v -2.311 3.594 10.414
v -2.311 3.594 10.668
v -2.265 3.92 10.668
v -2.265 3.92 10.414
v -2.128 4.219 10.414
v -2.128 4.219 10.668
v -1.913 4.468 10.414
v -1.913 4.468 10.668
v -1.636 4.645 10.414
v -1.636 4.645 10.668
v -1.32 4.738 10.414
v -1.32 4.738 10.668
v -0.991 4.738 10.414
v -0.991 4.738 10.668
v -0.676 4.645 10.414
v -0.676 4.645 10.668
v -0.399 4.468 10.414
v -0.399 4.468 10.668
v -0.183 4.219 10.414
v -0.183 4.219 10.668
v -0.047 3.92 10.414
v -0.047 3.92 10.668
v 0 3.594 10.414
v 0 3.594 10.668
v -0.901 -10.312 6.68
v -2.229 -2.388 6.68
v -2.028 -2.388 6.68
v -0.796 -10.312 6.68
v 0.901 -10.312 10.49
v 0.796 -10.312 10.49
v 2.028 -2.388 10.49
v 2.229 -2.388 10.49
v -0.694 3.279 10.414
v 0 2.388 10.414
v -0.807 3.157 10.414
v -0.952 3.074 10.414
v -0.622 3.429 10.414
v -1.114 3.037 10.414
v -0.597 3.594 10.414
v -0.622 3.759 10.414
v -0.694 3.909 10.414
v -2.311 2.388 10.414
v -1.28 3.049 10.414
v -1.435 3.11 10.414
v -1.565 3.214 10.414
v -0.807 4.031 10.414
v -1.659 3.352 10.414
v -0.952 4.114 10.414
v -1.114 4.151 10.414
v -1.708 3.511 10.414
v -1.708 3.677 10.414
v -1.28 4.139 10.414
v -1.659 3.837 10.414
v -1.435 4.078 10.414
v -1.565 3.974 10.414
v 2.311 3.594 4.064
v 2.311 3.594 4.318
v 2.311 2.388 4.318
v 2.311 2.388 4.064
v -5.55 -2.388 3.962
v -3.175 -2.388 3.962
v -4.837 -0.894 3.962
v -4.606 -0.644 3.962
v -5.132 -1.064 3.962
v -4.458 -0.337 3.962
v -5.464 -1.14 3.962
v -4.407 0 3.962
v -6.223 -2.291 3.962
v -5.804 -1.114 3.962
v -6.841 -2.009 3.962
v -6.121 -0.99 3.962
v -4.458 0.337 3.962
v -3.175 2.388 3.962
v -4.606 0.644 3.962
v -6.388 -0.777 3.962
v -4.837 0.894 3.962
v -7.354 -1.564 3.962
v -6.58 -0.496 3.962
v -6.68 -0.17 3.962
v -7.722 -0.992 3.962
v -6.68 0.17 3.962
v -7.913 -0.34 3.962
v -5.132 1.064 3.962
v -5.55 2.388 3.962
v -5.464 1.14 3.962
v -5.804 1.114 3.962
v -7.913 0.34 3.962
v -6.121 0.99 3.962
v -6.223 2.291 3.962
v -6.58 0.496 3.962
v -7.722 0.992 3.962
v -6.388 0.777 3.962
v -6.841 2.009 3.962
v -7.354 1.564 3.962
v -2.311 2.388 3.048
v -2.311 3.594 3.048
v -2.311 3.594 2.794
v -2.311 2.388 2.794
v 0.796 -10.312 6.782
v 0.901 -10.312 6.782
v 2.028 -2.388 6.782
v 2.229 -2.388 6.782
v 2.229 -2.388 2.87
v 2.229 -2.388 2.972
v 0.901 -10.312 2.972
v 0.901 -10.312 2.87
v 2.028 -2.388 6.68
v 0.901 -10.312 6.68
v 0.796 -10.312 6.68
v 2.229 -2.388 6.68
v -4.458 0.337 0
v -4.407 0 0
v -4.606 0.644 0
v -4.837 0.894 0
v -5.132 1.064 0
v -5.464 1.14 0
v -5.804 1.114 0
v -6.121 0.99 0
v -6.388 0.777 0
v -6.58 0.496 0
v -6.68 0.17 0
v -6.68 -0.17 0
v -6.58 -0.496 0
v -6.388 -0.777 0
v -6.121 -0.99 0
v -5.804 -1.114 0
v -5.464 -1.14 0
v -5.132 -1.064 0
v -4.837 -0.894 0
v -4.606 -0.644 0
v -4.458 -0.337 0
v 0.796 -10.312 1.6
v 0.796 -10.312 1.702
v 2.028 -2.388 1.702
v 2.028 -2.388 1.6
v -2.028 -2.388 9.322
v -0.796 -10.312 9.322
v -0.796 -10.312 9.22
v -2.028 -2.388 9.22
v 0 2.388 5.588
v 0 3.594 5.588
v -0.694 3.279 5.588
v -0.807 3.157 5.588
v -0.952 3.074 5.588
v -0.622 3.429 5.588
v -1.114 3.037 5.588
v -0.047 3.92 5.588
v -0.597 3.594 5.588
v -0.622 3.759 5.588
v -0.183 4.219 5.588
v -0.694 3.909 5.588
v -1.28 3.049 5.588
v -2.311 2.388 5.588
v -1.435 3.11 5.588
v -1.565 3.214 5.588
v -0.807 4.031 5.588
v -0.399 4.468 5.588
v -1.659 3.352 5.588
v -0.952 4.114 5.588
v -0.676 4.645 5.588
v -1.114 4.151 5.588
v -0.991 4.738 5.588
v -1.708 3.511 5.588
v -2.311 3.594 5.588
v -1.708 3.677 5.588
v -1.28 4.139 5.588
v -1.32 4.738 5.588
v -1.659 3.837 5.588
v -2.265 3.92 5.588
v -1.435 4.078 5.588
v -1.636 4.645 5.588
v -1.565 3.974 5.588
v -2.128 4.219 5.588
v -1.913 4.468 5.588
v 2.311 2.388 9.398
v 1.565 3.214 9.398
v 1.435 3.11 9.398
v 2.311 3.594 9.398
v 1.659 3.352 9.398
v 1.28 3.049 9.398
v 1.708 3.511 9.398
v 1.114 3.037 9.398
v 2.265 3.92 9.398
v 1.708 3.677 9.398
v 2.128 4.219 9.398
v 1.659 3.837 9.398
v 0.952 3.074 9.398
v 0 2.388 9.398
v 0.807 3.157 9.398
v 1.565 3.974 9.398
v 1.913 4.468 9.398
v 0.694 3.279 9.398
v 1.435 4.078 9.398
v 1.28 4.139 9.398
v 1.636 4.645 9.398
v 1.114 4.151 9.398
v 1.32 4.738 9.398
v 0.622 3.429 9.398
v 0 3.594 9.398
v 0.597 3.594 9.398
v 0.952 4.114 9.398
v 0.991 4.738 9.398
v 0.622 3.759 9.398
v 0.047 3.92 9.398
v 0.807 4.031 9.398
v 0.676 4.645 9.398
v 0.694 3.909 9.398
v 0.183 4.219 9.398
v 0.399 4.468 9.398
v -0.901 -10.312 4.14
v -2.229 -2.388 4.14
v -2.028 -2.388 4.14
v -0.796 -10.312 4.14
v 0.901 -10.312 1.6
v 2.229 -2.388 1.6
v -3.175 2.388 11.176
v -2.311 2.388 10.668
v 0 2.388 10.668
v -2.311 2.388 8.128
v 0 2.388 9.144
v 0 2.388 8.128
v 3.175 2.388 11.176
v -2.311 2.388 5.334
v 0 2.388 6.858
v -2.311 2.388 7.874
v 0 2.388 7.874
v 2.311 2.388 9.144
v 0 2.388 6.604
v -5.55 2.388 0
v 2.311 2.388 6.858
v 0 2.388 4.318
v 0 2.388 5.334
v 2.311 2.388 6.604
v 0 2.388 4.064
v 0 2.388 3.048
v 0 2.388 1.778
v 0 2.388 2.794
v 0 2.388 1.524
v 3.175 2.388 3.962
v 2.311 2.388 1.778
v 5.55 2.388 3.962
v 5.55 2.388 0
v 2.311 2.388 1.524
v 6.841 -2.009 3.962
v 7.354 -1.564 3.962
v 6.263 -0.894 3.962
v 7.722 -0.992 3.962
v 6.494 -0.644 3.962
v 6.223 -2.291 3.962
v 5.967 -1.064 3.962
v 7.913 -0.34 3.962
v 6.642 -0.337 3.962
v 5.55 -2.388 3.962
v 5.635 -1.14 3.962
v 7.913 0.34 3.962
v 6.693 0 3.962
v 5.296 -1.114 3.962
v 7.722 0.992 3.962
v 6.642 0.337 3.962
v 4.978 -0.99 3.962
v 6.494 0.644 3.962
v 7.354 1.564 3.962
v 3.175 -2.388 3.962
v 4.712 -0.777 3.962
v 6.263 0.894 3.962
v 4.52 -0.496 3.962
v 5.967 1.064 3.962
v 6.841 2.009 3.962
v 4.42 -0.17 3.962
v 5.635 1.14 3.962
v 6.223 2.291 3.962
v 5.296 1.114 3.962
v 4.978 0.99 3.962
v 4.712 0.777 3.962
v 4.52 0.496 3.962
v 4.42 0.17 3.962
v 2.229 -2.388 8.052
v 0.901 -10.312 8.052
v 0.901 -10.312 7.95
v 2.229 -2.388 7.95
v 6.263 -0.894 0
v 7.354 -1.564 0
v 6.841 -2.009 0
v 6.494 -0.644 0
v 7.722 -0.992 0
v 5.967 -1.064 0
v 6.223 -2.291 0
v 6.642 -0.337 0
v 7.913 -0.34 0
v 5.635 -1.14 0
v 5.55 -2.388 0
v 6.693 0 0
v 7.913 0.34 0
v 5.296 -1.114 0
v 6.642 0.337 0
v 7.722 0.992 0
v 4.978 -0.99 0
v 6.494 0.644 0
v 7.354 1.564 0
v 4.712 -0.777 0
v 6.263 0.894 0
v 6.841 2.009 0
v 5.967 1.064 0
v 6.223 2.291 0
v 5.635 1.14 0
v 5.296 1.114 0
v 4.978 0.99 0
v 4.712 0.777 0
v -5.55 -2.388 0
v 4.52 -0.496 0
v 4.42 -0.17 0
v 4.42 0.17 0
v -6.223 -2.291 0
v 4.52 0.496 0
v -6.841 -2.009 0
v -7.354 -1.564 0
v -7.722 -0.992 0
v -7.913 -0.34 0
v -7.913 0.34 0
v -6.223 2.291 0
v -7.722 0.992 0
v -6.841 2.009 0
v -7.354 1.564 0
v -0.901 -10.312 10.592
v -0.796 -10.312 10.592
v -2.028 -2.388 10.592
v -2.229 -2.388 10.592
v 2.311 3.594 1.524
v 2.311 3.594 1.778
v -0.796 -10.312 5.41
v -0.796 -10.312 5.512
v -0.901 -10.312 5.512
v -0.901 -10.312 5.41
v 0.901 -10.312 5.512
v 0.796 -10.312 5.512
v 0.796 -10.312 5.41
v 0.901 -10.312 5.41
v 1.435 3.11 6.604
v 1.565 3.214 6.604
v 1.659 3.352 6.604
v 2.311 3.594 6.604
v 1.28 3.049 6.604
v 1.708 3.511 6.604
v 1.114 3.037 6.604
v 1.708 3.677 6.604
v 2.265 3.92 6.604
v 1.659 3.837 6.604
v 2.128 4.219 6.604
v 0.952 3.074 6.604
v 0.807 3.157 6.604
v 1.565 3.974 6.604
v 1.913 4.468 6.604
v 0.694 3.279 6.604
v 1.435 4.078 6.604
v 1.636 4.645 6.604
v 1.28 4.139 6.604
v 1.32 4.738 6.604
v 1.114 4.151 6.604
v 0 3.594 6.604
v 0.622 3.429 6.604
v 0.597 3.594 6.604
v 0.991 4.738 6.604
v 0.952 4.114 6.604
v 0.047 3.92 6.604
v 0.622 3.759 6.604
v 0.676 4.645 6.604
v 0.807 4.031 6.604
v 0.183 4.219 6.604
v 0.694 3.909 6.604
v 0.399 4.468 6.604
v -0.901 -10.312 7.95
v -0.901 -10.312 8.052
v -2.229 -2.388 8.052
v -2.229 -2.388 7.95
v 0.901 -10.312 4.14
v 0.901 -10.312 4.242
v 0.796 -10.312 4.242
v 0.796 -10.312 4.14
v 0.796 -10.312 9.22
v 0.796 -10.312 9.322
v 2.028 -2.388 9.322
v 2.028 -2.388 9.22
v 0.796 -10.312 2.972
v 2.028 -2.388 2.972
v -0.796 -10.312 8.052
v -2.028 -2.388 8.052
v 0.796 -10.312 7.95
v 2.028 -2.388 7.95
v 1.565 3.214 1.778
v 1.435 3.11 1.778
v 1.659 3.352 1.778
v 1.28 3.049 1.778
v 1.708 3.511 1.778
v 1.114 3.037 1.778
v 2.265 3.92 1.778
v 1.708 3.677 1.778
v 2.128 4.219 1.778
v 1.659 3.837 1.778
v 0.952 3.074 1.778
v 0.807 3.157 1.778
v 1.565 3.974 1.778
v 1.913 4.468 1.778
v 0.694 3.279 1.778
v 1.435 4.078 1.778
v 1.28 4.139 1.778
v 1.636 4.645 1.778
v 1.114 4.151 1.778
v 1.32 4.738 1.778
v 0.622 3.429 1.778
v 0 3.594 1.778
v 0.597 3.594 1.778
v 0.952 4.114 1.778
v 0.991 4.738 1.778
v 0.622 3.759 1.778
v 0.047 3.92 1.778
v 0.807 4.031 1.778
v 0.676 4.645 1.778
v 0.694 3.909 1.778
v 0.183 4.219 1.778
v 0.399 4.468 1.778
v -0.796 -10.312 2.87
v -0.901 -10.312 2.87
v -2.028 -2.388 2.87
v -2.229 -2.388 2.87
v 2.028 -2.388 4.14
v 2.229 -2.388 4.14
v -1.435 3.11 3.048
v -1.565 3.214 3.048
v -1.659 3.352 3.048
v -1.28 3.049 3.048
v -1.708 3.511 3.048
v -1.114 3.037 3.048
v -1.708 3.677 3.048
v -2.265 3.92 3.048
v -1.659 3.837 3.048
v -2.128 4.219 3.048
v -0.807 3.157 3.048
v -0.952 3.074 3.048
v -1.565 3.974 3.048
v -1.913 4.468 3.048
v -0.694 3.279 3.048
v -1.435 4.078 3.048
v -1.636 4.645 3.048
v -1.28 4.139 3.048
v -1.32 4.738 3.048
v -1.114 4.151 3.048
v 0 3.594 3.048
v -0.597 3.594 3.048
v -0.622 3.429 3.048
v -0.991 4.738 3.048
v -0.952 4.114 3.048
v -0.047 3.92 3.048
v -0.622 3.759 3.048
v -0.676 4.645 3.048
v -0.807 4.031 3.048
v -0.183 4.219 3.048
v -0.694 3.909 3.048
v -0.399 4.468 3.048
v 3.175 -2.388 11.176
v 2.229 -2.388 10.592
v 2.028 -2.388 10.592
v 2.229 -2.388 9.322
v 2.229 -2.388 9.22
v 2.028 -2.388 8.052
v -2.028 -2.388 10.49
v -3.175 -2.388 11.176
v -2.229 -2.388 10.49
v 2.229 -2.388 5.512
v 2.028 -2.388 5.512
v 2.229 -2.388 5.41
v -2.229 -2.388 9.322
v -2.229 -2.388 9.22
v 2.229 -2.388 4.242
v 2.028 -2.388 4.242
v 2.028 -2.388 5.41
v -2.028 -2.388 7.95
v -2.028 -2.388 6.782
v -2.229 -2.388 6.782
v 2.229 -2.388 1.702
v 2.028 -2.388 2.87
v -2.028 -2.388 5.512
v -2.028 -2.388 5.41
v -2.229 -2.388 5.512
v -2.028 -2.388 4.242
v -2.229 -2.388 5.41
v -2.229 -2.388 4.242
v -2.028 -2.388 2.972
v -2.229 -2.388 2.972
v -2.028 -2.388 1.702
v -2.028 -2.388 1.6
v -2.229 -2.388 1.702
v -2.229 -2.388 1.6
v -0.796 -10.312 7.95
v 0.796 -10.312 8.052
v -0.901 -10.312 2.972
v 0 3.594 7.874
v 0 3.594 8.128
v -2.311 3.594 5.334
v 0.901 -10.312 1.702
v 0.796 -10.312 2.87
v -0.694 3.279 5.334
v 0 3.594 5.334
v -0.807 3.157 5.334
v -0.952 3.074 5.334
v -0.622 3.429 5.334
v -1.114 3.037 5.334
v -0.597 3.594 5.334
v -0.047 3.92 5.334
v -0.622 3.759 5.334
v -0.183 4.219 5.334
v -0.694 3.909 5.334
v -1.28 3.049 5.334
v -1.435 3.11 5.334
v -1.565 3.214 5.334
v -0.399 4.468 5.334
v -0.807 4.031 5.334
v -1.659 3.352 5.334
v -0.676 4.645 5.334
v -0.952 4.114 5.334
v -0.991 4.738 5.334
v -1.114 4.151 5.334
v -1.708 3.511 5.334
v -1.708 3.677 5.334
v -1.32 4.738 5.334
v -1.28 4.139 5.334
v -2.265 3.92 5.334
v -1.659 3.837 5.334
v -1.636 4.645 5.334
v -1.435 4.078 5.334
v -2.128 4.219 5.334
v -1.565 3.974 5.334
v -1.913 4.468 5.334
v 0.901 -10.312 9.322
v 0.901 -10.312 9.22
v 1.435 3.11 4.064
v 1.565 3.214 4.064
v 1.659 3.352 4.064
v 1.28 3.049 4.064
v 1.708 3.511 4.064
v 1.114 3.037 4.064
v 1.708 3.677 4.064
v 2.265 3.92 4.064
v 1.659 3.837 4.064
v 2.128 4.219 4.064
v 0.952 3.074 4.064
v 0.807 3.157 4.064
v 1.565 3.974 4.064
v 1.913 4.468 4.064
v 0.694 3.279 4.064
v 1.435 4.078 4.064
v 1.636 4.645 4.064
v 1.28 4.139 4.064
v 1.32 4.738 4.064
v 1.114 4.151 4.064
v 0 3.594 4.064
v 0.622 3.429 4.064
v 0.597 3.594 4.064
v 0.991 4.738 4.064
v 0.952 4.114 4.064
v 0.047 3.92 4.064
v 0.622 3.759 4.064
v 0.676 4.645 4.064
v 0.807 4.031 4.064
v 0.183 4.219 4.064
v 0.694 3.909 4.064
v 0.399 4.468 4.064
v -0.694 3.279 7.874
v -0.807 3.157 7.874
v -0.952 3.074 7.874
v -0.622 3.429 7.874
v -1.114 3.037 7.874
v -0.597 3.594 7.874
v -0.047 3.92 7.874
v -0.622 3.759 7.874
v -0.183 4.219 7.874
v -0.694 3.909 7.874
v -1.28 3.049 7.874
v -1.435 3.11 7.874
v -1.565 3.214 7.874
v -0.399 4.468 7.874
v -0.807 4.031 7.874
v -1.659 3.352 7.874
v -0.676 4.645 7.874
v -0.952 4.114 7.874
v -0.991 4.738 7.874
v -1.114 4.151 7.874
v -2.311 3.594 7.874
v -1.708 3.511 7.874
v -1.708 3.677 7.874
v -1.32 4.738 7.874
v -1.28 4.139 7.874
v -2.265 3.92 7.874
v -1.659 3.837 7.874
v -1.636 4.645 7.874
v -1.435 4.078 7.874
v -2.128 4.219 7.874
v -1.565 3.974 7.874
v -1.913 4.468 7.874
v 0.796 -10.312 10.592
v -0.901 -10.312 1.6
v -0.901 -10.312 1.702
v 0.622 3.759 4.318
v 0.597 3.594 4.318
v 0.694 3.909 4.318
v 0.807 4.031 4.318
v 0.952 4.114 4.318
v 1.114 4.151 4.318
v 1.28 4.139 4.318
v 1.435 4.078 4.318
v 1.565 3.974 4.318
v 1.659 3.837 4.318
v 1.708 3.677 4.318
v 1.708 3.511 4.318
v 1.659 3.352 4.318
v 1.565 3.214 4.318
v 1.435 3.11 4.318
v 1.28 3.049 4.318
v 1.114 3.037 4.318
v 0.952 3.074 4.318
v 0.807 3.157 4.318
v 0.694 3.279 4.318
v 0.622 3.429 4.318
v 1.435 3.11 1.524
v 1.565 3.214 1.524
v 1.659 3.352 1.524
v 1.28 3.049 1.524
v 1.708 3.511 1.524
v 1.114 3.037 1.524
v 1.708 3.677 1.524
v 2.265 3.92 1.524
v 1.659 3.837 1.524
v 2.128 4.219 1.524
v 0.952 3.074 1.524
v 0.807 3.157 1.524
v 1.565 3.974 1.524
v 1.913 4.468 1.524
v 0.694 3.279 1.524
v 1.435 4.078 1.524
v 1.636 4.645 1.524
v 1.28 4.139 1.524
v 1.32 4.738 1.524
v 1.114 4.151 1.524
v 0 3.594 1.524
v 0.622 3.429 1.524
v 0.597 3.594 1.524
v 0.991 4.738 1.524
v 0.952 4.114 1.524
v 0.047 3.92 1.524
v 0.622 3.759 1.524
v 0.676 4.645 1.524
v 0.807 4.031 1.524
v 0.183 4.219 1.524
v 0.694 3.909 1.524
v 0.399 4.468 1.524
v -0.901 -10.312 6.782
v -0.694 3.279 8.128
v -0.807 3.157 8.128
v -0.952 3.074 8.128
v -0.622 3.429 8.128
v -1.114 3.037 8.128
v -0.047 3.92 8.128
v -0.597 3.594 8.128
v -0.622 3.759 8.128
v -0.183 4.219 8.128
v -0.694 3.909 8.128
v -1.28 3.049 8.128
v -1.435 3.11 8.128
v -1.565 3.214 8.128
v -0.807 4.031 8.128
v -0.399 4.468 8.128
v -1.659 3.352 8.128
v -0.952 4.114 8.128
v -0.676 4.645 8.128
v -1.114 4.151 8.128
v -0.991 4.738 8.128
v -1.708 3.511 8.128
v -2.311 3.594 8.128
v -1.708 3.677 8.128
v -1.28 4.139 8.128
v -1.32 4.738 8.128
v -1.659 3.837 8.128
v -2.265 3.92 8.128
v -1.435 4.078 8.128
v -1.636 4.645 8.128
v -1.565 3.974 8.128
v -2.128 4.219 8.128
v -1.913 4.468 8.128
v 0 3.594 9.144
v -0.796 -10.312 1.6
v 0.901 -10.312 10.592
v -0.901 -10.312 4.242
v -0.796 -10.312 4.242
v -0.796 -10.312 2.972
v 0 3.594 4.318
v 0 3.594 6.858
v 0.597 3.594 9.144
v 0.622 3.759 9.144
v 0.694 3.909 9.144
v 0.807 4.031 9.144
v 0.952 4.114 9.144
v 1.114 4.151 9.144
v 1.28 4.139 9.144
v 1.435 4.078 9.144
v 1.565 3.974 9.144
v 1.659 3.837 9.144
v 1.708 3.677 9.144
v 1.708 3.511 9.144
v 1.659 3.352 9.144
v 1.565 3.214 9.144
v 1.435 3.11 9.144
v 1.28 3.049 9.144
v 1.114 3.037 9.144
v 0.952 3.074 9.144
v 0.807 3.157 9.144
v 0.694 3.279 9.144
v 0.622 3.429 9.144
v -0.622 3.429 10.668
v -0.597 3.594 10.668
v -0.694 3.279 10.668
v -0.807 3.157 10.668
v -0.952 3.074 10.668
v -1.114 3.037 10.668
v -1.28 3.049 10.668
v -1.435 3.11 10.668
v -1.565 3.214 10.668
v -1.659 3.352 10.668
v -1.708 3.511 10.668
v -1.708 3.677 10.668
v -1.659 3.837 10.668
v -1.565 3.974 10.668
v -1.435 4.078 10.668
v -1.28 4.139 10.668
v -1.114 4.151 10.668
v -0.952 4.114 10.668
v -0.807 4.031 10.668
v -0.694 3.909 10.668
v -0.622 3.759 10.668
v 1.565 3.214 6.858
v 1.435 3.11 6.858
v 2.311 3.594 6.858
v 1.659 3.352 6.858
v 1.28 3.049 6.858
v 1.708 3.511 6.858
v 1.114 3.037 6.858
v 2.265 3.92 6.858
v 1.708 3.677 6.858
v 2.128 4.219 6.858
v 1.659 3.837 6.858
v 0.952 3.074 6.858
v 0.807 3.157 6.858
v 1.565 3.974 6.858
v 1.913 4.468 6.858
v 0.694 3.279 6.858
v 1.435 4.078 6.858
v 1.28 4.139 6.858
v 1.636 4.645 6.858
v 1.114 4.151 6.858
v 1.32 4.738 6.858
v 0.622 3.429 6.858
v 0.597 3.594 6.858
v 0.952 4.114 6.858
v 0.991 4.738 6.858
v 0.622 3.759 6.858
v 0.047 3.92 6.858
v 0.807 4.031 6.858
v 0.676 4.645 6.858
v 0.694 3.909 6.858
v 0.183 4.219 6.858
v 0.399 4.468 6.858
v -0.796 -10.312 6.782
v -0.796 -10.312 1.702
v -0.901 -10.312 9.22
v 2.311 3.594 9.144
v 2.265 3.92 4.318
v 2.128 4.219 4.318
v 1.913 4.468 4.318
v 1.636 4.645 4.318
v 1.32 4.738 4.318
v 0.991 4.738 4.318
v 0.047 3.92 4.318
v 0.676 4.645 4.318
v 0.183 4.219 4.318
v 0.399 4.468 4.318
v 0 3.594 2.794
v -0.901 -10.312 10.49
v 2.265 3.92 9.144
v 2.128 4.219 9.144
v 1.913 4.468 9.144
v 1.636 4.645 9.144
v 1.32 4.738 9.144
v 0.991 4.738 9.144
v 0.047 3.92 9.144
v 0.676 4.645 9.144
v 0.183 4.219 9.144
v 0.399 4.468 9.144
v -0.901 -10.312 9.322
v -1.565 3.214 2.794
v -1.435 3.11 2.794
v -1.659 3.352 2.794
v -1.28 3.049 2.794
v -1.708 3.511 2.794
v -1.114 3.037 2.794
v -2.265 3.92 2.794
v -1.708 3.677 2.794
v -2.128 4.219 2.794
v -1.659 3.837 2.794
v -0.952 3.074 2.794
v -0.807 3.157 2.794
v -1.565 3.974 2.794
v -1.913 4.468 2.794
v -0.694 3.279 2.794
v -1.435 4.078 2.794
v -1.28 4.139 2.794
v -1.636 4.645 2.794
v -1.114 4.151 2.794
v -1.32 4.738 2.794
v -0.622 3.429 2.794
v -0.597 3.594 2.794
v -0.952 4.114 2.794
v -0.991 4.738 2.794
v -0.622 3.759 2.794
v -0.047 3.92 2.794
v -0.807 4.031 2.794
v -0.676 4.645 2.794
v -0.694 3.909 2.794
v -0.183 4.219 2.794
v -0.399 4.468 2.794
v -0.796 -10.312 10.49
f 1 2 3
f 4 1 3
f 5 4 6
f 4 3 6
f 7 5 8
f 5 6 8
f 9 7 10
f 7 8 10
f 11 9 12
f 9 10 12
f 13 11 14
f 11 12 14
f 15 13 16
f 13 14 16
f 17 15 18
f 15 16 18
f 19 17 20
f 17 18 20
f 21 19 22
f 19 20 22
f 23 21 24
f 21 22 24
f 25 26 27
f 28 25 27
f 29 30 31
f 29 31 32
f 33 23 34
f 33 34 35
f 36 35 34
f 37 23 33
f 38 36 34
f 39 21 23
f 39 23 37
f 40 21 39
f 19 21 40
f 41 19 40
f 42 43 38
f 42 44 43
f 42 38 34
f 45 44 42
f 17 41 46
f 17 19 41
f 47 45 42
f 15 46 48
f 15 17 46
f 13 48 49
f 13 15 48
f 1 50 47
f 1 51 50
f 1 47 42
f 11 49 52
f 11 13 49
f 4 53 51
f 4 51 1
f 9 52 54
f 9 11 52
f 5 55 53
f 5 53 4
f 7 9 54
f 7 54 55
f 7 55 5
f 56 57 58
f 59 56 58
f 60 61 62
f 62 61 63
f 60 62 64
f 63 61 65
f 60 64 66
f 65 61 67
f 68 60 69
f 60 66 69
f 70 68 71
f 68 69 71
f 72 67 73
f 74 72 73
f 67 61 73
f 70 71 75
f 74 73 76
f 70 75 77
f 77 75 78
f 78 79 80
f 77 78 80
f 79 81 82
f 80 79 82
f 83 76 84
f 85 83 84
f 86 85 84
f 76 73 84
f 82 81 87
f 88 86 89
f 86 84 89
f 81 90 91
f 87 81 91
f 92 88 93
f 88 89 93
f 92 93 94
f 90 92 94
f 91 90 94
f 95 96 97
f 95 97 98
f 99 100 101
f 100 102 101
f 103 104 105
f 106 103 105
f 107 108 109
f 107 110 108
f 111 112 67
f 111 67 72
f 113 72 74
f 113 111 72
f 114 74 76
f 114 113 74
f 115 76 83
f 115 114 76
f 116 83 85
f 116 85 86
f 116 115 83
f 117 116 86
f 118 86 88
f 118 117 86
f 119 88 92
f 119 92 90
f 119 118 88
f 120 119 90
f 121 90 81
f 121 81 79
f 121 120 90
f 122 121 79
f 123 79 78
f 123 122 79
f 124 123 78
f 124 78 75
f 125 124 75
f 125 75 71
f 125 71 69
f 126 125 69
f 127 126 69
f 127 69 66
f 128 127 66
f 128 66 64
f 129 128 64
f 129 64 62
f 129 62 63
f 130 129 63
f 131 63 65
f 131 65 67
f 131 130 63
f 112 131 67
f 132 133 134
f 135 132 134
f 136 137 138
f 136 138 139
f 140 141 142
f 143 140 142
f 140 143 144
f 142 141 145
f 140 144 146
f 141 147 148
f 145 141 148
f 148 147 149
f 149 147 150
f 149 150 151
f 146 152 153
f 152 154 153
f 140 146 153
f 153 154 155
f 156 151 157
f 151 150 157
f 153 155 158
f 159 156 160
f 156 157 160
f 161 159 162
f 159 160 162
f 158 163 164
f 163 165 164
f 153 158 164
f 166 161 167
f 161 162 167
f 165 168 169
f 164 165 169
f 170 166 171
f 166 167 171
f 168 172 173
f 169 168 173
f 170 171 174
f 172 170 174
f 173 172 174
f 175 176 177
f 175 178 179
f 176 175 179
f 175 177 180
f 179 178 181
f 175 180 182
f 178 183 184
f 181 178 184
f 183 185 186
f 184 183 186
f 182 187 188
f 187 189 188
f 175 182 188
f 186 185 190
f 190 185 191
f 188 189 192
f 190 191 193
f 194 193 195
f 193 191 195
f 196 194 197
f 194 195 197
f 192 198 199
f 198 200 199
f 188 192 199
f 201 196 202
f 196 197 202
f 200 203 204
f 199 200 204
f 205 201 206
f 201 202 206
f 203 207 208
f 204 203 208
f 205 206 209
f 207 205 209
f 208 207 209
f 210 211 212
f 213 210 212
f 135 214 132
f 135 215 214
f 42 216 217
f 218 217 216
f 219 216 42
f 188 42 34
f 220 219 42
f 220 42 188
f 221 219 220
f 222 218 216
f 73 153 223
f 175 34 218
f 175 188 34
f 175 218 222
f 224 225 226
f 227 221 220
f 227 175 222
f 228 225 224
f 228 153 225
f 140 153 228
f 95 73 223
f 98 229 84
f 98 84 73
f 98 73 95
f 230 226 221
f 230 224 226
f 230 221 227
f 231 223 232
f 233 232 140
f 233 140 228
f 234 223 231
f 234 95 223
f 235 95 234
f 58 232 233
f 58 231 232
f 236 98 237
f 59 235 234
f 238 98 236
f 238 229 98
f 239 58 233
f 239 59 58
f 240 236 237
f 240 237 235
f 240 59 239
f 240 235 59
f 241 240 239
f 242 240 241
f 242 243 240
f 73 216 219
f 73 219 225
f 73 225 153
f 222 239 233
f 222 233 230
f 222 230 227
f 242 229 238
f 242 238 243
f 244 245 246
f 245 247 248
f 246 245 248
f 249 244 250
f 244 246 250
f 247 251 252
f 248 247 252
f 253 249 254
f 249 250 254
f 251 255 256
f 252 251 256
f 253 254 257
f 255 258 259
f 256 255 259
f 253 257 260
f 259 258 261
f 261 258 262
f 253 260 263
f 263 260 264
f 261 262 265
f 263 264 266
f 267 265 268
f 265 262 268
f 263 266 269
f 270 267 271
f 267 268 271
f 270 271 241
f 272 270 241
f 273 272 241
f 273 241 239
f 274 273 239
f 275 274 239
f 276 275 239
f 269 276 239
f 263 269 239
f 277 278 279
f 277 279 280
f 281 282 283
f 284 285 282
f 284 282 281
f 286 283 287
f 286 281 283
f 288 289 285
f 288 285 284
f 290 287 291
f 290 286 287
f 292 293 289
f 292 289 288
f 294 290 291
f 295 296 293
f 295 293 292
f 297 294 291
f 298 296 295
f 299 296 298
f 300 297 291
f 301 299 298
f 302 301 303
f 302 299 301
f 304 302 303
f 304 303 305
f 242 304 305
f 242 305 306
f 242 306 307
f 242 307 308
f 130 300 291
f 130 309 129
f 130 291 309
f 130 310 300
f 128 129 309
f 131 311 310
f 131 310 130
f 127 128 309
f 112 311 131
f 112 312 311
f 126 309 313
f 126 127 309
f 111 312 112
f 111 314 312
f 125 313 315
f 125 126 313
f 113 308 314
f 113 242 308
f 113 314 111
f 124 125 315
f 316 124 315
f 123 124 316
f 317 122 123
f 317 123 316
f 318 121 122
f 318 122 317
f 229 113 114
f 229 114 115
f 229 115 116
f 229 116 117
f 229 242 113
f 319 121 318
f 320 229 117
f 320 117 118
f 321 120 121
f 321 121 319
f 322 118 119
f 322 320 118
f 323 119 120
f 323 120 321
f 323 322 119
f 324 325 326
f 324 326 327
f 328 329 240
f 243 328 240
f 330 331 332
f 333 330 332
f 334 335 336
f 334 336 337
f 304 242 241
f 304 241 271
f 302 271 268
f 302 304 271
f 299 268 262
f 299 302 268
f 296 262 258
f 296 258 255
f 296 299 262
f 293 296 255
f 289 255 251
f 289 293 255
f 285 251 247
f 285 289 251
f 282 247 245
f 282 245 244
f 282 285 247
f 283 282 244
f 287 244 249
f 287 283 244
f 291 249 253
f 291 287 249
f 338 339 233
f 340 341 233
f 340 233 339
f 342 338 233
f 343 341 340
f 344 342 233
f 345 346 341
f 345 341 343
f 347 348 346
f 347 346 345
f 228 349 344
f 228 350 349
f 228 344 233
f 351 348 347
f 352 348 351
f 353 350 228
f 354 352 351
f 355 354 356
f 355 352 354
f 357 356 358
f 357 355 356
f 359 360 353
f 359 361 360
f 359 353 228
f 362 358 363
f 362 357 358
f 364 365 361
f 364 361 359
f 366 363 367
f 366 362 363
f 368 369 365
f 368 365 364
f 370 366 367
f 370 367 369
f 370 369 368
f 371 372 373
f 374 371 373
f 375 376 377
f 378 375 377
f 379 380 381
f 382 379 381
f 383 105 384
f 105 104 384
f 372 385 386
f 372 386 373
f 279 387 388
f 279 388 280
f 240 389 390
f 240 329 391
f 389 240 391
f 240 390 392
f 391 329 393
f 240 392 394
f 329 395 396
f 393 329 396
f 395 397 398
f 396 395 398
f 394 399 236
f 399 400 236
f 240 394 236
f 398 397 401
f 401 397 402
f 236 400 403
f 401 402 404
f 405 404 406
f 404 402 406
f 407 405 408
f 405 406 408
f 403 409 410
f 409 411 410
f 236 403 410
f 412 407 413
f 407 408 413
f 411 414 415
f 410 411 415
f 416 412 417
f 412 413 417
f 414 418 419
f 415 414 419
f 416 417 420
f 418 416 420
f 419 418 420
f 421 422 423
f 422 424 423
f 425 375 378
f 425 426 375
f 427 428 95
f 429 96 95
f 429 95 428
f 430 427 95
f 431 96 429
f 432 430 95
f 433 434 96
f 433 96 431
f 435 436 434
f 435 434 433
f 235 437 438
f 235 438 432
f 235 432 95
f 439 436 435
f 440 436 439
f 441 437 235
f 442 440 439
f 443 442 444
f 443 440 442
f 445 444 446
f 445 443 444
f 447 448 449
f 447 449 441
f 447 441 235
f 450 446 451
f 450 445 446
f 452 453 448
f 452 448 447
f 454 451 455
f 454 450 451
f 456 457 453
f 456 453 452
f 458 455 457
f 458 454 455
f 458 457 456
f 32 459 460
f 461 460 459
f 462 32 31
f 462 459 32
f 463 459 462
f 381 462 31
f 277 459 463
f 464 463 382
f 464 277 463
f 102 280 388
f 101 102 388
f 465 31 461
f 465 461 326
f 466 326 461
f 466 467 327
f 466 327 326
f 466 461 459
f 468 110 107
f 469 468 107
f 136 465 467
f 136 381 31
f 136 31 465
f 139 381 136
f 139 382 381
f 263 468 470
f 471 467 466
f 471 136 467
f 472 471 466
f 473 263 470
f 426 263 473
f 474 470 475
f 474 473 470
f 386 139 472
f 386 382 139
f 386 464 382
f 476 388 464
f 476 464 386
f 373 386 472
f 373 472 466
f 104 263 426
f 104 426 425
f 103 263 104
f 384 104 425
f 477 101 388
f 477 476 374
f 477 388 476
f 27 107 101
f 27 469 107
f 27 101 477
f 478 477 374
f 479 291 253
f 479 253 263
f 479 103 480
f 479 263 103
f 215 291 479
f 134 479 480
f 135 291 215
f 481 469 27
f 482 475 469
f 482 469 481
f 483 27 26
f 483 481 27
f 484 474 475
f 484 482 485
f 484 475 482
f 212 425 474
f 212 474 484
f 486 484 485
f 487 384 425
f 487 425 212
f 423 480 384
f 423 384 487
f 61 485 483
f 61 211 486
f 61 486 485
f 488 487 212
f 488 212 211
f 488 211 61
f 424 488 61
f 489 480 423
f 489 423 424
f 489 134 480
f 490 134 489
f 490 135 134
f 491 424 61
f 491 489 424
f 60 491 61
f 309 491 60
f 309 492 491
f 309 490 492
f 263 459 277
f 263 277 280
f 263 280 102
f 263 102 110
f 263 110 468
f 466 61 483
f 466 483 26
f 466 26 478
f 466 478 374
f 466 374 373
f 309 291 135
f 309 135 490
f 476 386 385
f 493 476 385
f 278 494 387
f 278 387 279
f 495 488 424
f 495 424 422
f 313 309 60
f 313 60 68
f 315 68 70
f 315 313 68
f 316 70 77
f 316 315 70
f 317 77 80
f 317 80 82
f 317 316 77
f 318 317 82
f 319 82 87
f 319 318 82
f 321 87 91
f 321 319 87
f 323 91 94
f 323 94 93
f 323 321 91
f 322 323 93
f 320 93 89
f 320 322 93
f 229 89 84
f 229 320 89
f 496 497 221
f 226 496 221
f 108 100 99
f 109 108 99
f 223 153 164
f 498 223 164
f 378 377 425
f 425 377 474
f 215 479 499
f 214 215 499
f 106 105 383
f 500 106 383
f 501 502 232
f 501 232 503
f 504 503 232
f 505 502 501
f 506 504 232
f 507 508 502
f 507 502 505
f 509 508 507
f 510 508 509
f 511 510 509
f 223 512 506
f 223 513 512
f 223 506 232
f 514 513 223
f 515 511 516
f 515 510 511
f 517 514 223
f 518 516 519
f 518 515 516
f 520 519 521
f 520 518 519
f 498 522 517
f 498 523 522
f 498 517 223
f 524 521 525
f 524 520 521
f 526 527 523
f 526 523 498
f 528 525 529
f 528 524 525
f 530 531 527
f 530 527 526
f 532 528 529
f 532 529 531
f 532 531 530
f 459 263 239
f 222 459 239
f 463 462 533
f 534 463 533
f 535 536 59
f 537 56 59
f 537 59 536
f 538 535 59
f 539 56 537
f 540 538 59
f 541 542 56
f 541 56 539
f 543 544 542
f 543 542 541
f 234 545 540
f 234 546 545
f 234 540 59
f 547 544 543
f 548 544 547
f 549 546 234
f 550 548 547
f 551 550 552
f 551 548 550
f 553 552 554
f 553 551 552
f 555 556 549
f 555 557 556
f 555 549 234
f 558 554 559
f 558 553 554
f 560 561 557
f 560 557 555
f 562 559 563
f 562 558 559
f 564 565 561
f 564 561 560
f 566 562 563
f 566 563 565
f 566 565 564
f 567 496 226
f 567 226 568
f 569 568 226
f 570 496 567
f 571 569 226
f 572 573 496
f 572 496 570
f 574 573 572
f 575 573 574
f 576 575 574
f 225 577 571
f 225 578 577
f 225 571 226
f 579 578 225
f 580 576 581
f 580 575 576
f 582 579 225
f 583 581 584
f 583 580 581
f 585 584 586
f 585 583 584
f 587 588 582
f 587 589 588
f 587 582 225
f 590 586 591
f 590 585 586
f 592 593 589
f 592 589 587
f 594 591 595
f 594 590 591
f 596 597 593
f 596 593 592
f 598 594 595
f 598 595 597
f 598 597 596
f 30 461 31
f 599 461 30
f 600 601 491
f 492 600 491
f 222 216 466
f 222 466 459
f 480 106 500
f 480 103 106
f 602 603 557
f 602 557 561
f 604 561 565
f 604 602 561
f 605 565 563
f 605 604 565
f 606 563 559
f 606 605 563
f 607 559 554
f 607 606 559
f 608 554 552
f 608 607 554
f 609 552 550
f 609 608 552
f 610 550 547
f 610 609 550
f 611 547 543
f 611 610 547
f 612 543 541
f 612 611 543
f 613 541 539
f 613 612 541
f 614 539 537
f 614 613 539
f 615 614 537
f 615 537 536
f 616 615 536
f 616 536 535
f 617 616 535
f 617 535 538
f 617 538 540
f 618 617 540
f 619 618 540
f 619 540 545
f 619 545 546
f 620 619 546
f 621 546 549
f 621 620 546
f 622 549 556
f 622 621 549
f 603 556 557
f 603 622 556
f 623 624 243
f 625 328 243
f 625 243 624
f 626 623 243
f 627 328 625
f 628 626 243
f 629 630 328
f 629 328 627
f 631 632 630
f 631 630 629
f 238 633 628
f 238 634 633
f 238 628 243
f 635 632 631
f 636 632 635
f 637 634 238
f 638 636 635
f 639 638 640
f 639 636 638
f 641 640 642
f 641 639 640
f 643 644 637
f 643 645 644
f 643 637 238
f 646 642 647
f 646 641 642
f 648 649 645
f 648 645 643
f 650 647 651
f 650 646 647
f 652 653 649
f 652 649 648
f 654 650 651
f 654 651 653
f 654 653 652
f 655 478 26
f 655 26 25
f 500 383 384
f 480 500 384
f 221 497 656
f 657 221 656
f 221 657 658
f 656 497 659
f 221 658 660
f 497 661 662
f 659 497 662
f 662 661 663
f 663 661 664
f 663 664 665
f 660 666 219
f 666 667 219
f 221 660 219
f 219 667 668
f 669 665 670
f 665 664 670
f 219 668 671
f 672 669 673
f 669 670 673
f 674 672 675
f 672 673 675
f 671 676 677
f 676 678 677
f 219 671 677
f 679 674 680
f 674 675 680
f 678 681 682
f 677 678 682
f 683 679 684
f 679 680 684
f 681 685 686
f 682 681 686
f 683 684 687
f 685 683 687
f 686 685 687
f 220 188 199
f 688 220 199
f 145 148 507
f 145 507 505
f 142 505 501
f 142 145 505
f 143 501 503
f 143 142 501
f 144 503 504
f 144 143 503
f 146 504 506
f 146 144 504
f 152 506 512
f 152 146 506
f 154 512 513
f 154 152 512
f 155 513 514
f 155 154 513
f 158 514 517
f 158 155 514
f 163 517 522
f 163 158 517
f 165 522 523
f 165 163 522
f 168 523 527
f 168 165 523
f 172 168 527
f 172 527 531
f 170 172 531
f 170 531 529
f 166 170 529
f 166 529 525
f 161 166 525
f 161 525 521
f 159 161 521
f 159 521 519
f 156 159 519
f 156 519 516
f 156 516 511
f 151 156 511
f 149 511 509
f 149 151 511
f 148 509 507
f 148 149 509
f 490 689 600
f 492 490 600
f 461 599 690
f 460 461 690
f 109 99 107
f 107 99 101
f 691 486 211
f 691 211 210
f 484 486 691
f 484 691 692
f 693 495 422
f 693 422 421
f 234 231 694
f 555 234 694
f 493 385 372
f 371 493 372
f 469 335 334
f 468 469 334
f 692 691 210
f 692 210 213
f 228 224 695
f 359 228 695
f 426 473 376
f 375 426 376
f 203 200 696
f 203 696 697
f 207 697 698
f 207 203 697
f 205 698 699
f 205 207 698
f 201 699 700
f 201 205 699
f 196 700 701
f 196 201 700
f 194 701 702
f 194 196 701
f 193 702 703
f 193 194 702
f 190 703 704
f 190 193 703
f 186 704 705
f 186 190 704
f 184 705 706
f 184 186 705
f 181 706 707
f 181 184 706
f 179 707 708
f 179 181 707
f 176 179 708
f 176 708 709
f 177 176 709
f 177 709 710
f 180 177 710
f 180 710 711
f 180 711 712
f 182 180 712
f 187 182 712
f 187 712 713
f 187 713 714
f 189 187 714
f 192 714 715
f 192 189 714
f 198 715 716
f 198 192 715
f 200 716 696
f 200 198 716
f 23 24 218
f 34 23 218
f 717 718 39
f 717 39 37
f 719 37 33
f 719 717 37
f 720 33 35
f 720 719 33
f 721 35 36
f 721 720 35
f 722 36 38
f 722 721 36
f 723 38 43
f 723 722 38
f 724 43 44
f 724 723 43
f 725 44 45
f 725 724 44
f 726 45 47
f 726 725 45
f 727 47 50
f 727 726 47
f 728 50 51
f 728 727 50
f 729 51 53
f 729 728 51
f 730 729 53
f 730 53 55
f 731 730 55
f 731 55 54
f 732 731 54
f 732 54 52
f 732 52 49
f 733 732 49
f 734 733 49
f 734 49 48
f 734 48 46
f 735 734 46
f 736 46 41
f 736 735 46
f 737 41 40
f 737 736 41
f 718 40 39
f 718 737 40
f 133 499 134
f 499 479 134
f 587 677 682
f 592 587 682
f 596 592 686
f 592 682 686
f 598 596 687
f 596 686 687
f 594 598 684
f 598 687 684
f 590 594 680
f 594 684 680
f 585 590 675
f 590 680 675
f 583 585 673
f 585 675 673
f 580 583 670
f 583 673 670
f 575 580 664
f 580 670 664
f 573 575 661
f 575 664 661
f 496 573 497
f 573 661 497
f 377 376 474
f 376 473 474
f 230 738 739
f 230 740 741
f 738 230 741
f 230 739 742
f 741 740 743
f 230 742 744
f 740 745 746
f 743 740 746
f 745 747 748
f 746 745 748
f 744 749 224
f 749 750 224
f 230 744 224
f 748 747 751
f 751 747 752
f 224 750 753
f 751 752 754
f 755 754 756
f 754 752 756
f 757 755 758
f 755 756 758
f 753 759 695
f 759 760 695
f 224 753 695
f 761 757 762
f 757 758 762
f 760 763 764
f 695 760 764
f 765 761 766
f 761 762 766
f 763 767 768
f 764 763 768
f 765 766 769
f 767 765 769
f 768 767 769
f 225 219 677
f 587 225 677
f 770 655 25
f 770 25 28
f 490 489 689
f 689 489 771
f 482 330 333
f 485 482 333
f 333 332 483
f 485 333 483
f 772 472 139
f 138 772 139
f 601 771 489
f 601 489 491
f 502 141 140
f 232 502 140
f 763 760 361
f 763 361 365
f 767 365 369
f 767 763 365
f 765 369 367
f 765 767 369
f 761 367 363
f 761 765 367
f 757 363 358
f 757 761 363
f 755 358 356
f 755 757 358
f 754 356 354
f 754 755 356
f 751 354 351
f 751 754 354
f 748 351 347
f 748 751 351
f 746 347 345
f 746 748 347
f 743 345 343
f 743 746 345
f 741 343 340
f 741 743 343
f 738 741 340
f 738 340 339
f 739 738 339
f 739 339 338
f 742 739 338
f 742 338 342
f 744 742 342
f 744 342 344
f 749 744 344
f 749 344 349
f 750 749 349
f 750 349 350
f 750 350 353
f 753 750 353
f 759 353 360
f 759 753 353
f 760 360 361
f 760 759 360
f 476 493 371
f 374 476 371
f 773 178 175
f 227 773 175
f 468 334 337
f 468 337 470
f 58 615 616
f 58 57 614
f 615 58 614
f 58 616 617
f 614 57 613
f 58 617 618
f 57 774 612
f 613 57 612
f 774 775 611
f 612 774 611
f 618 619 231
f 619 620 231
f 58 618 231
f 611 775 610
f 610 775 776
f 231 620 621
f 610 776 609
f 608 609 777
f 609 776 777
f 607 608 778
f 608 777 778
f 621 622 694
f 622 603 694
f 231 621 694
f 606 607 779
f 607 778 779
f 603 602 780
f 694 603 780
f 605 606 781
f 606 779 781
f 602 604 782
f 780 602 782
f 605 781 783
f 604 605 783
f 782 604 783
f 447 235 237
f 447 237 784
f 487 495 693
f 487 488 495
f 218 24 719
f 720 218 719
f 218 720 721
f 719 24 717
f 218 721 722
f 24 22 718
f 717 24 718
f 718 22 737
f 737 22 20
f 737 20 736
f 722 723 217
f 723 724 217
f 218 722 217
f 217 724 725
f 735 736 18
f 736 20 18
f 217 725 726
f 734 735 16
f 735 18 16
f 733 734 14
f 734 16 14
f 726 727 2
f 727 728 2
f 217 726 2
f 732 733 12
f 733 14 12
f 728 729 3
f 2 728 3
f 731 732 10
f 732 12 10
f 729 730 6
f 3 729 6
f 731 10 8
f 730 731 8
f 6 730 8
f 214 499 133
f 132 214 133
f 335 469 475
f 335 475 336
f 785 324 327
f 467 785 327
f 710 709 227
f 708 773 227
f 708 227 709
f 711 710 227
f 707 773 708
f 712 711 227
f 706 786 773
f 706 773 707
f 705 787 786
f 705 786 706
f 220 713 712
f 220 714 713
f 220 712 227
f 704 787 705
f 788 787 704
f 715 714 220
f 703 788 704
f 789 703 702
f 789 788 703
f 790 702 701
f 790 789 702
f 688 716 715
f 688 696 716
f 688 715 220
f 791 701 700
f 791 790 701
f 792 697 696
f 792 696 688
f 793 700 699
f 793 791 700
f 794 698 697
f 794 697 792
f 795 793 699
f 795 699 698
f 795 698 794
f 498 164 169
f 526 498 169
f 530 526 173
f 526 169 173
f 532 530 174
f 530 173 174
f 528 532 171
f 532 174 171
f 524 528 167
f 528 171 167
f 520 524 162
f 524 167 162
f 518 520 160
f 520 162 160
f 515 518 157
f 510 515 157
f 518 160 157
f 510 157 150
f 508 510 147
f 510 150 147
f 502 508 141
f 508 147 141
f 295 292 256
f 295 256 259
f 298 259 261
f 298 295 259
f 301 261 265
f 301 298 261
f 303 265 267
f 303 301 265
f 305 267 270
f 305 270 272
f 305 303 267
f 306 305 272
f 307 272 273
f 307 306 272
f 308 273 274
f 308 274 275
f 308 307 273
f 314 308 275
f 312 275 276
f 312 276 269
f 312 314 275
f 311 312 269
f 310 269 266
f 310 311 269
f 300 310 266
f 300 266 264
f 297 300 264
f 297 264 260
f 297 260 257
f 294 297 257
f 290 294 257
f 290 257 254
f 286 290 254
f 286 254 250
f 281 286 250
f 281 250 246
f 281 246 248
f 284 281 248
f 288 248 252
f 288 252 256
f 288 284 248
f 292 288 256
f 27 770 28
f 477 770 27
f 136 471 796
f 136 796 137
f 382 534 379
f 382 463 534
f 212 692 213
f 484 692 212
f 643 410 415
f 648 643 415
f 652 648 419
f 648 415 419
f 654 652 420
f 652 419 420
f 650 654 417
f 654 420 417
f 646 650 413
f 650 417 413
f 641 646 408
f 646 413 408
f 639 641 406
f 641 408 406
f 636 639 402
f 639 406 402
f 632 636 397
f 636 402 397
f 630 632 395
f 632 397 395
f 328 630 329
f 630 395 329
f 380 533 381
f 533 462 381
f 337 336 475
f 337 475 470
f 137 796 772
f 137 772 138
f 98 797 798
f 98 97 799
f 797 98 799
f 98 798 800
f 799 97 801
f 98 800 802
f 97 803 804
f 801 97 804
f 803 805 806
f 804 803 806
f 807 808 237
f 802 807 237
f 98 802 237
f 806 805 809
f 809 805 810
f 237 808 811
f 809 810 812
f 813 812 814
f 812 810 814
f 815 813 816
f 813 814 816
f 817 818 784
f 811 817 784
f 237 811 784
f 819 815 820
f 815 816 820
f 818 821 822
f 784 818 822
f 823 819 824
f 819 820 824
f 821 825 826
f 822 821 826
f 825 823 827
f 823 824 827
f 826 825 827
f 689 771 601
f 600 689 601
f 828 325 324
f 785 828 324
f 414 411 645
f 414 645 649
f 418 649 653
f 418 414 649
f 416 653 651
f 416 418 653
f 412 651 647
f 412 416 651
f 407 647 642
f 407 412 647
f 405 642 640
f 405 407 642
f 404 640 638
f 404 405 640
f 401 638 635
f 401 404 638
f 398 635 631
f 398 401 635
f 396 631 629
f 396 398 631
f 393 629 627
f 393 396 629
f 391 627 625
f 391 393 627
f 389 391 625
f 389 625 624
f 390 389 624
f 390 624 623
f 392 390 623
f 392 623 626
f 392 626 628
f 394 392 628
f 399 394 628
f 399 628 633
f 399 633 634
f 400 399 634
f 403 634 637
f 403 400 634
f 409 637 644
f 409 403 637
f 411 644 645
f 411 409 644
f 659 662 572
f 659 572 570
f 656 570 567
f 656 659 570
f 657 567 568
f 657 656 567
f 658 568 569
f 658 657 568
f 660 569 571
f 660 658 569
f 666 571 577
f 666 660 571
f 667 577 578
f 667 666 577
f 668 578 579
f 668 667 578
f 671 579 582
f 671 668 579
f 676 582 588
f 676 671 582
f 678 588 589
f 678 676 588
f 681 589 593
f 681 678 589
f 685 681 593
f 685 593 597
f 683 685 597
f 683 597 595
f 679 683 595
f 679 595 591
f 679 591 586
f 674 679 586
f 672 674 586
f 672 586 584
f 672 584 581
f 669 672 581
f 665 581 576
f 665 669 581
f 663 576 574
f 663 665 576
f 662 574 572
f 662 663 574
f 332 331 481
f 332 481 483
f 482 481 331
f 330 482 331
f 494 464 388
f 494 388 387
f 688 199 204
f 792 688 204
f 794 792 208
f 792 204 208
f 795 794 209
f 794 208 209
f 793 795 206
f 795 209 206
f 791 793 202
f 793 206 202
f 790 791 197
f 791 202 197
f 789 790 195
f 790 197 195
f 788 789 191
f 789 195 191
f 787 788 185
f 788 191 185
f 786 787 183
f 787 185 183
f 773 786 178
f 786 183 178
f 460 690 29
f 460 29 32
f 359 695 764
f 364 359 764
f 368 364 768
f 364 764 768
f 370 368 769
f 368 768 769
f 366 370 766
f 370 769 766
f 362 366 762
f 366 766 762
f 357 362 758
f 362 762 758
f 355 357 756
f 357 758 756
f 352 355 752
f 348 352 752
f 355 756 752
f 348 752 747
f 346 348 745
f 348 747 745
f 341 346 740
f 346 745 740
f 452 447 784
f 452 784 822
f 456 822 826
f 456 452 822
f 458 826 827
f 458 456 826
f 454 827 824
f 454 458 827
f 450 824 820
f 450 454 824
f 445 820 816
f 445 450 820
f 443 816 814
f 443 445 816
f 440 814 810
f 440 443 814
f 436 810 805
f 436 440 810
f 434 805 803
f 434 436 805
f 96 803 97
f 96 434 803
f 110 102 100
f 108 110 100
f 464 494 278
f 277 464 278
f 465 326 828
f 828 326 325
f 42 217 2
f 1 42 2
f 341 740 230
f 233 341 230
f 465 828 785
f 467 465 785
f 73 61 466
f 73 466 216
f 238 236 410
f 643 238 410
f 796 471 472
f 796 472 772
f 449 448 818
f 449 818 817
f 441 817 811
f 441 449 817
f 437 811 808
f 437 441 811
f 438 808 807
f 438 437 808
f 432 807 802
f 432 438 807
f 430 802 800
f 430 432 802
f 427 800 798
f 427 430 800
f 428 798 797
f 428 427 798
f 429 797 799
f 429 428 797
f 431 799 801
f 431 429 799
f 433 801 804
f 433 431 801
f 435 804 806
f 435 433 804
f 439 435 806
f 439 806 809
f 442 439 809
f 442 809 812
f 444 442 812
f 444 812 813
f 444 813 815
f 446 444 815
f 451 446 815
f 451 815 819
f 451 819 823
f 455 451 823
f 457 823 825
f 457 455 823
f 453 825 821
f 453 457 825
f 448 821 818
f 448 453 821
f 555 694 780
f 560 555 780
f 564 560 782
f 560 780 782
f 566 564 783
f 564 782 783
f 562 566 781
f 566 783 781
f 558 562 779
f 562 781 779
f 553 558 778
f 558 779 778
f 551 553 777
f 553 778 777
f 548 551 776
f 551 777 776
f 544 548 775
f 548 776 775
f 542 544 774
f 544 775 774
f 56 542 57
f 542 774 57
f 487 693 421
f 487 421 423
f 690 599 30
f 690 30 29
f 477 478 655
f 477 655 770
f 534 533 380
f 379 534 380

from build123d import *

# Parameters (mm, degrees)
SKETCH1_R                 = 1.143
BOSS_EXTRUDE1_DEPTH       = 3.9624
SKETCH2_W                 = 6.35
SKETCH2_H                 = 4.7752
BOSS_EXTRUDE2_DEPTH       = 7.2136
BOSS_EXTRUDE3_DEPTH       = 0.127
BOSS_EXTRUDE3_DEPTH_BACK  = 0.127
SKETCH3_R                 = 0.5588
BOSS_EXTRUDE4_DEPTH       = 0.127
BOSS_EXTRUDE4_DEPTH_BACK  = 0.127
SKETCH4_R                 = 0.5588
BOSS_EXTRUDE5_DEPTH       = 0.127
BOSS_EXTRUDE5_DEPTH_BACK  = 0.127
SKETCH5_R                 = 0.5588
BOSS_EXTRUDE6_DEPTH       = 0.127
BOSS_EXTRUDE6_DEPTH_BACK  = 0.127
SKETCH7_R                 = 0.5588
BOSS_EXTRUDE7_DEPTH       = 0.127
BOSS_EXTRUDE7_DEPTH_BACK  = 0.127
SKETCH6_R                 = 0.5588
BOSS_EXTRUDE8_DEPTH       = 0.0508
BOSS_EXTRUDE8_DEPTH_BACK  = 0.0508
BOSS_EXTRUDE11_DEPTH      = 0.0508
BOSS_EXTRUDE11_DEPTH_BACK = 0.0508
BOSS_EXTRUDE12_DEPTH      = 0.0508
BOSS_EXTRUDE12_DEPTH_BACK = 0.0508
BOSS_EXTRUDE13_DEPTH      = 0.0508
BOSS_EXTRUDE13_DEPTH_BACK = 0.0508
BOSS_EXTRUDE14_DEPTH      = 0.0508
BOSS_EXTRUDE14_DEPTH_BACK = 0.0508
BOSS_EXTRUDE15_DEPTH      = 0.0508
BOSS_EXTRUDE15_DEPTH_BACK = 0.0508
BOSS_EXTRUDE16_DEPTH      = 0.0508
BOSS_EXTRUDE16_DEPTH_BACK = 0.0508
BOSS_EXTRUDE17_DEPTH      = 0.0508
BOSS_EXTRUDE17_DEPTH_BACK = 0.0508
BOSS_EXTRUDE18_DEPTH      = 0.127
BOSS_EXTRUDE18_DEPTH_BACK = 0.127
SKETCH16_R                = 0.5588
BOSS_EXTRUDE19_DEPTH      = 0.127
BOSS_EXTRUDE19_DEPTH_BACK = 0.127
SKETCH18_R                = 0.5588
BOSS_EXTRUDE20_DEPTH      = 0.127
BOSS_EXTRUDE20_DEPTH_BACK = 0.127
SKETCH17_R                = 0.5588


with BuildPart() as part:
    # Sketch1 → Boss-Extrude1 (new body)
    with BuildSketch(Plane.XY):
        with BuildLine():
            Line((-5.5499, 2.3876), (5.5499, 2.3876))
            ThreePointArc((5.5499, 2.3876), (7.9375, 0), (5.5499, -2.3876))
            Line((5.5499, -2.3876), (-5.5499, -2.3876))
            ThreePointArc((-5.5499, -2.3876), (-7.9375, 0), (-5.5499, 2.3876))
        make_face()
        with Locations((-5.5499, 0)):
            Circle(SKETCH1_R, mode=Mode.SUBTRACT)
        with Locations((5.5499, 0)):
            Circle(SKETCH1_R, mode=Mode.SUBTRACT)
    extrude(amount=BOSS_EXTRUDE1_DEPTH)

    # Sketch2 → Boss-Extrude2 (add)
    with BuildSketch(Plane.XY.offset(3.9624)):
        Rectangle(SKETCH2_W, SKETCH2_H)
    extrude(amount=BOSS_EXTRUDE2_DEPTH)

    # Sketch3 → Boss-Extrude3 (add, two sides: drawn at the far end of the back side and taken through both)
    with BuildSketch(Plane(origin=(0, 0, 1.651), x_dir=(-1, 0, 0), z_dir=(0, 0, -1)).offset(-BOSS_EXTRUDE3_DEPTH_BACK)):
        with BuildLine():
            Line((-2.3114, 3.5941), (-2.3114, 2.3876))
            Line((-2.3114, 2.3876), (0, 2.3876))
            Line((0, 2.3876), (0, 3.5941))
            ThreePointArc((0, 3.5941), (-1.1557, 4.7498), (-2.3114, 3.5941))
        make_face()
        with Locations((-1.1557, 3.5941)):
            Circle(SKETCH3_R, mode=Mode.SUBTRACT)
    extrude(amount=BOSS_EXTRUDE3_DEPTH + BOSS_EXTRUDE3_DEPTH_BACK)

    # Sketch4 → Boss-Extrude4 (add, two sides: drawn at the far end of the back side and taken through both)
    with BuildSketch(Plane(origin=(0, 0, 2.921), x_dir=(-1, 0, 0), z_dir=(0, 0, -1)).offset(-BOSS_EXTRUDE4_DEPTH_BACK)):
        with BuildLine():
            Line((2.3114, 3.5941), (2.3114, 2.3876))
            Line((2.3114, 2.3876), (0, 2.3876))
            Line((0, 2.3876), (0, 3.5941))
            ThreePointArc((0, 3.5941), (1.1557, 4.7498), (2.3114, 3.5941))
        make_face()
        with Locations((1.1557, 3.5941)):
            Circle(SKETCH4_R, mode=Mode.SUBTRACT)
    extrude(amount=BOSS_EXTRUDE4_DEPTH + BOSS_EXTRUDE4_DEPTH_BACK)

    # Sketch5 → Boss-Extrude5 (add, two sides: drawn at the far end of the back side and taken through both)
    with BuildSketch(Plane(origin=(0, 0, 4.191), x_dir=(-1, 0, 0), z_dir=(0, 0, -1)).offset(-BOSS_EXTRUDE5_DEPTH_BACK)):
        with BuildLine():
            Line((-2.3114, 3.5941), (-2.3114, 2.3876))
            Line((-2.3114, 2.3876), (0, 2.3876))
            Line((0, 2.3876), (0, 3.5941))
            ThreePointArc((0, 3.5941), (-1.1557, 4.7498), (-2.3114, 3.5941))
        make_face()
        with Locations((-1.1557, 3.5941)):
            Circle(SKETCH5_R, mode=Mode.SUBTRACT)
    extrude(amount=BOSS_EXTRUDE5_DEPTH + BOSS_EXTRUDE5_DEPTH_BACK)

    # Sketch7 → Boss-Extrude6 (add, two sides: drawn at the far end of the back side and taken through both)
    with BuildSketch(Plane(origin=(0, 0, 5.461), x_dir=(-1, 0, 0), z_dir=(0, 0, -1)).offset(-BOSS_EXTRUDE6_DEPTH_BACK)):
        with BuildLine():
            Line((2.3114, 2.3876), (2.3114, 3.5941))
            ThreePointArc((2.3114, 3.5941), (1.1557, 4.7498), (0, 3.5941))
            Line((0, 3.5941), (0, 2.3876))
            Line((0, 2.3876), (2.3114, 2.3876))
        make_face()
        with Locations((1.1557, 3.5941)):
            Circle(SKETCH7_R, mode=Mode.SUBTRACT)
    extrude(amount=BOSS_EXTRUDE6_DEPTH + BOSS_EXTRUDE6_DEPTH_BACK)

    # Sketch6 → Boss-Extrude7 (add, two sides: drawn at the far end of the back side and taken through both)
    with BuildSketch(Plane(origin=(0, 0, 6.731), x_dir=(-1, 0, 0), z_dir=(0, 0, -1)).offset(-BOSS_EXTRUDE7_DEPTH_BACK)):
        with BuildLine():
            Line((-2.3114, 3.5941), (-2.3114, 2.3876))
            Line((-2.3114, 2.3876), (0, 2.3876))
            Line((0, 2.3876), (0, 3.5941))
            ThreePointArc((0, 3.5941), (-1.1557, 4.7498), (-2.3114, 3.5941))
        make_face()
        with Locations((-1.1557, 3.5941)):
            Circle(SKETCH6_R, mode=Mode.SUBTRACT)
    extrude(amount=BOSS_EXTRUDE7_DEPTH + BOSS_EXTRUDE7_DEPTH_BACK)

    # Sketch8 → Boss-Extrude8 (add, two sides: drawn at the far end of the back side and taken through both)
    with BuildSketch(Plane(origin=(0, 0, 1.651), x_dir=(-1, 0, 0), z_dir=(0, 0, -1)).offset(-BOSS_EXTRUDE8_DEPTH_BACK)):
        Polygon((2.228681211, -2.3876), (2.028101851, -2.3876), (0.796265448, -10.3124), (0.900870757, -10.3124), align=None)
        Polygon((-0.900870757, -10.3124), (-0.796265448, -10.3124), (-2.028101851, -2.3876), (-2.228681211, -2.3876), align=None)
    extrude(amount=BOSS_EXTRUDE8_DEPTH + BOSS_EXTRUDE8_DEPTH_BACK)

    # Sketch11 → Boss-Extrude11 (add, two sides: drawn at the far end of the back side and taken through both)
    with BuildSketch(Plane(origin=(0, 0, 4.191), x_dir=(-1, 0, 0), z_dir=(0, 0, -1)).offset(-BOSS_EXTRUDE11_DEPTH_BACK)):
        Polygon((2.228681211, -2.3876), (0.900870757, -10.3124), (0.796265448, -10.3124), (2.028101851, -2.3876), align=None)
        Polygon((-0.900870757, -10.3124), (-0.796265448, -10.3124), (-2.028101851, -2.3876), (-2.228681211, -2.3876), align=None)
    extrude(amount=BOSS_EXTRUDE11_DEPTH + BOSS_EXTRUDE11_DEPTH_BACK)

    # Sketch12 → Boss-Extrude12 (add, two sides: drawn at the far end of the back side and taken through both)
    with BuildSketch(Plane(origin=(0, 0, 6.731), x_dir=(-1, 0, 0), z_dir=(0, 0, -1)).offset(-BOSS_EXTRUDE12_DEPTH_BACK)):
        Polygon((2.228681211, -2.3876), (0.900870757, -10.3124), (0.796265448, -10.3124), (2.028101851, -2.3876), align=None)
        Polygon((-0.900870757, -10.3124), (-0.796265448, -10.3124), (-2.028101851, -2.3876), (-2.228681211, -2.3876), align=None)
    extrude(amount=BOSS_EXTRUDE12_DEPTH + BOSS_EXTRUDE12_DEPTH_BACK)

    # Sketch13 → Boss-Extrude13 (add, two sides: drawn at the far end of the back side and taken through both)
    with BuildSketch(Plane(origin=(0, 0, 2.921), x_dir=(-1, 0, 0), z_dir=(0, 0, -1)).offset(-BOSS_EXTRUDE13_DEPTH_BACK)):
        Polygon((0.900870757, -10.3124), (0.796265448, -10.3124), (2.028101851, -2.3876), (2.228681211, -2.3876), align=None)
        Polygon((-0.900870757, -10.3124), (-0.796265448, -10.3124), (-2.028101851, -2.3876), (-2.228681211, -2.3876), align=None)
    extrude(amount=BOSS_EXTRUDE13_DEPTH + BOSS_EXTRUDE13_DEPTH_BACK)

    # Sketch15 → Boss-Extrude14 (add, two sides: drawn at the far end of the back side and taken through both)
    with BuildSketch(Plane(origin=(0, 0, 5.461), x_dir=(-1, 0, 0), z_dir=(0, 0, -1)).offset(-BOSS_EXTRUDE14_DEPTH_BACK)):
        Polygon((-0.900870757, -10.3124), (-2.228681211, -2.3876), (-2.028101851, -2.3876), (-0.796265448, -10.3124), align=None)
        Polygon((0.796265448, -10.3124), (0.900870757, -10.3124), (2.228681211, -2.3876), (2.028101851, -2.3876), align=None)
    extrude(amount=BOSS_EXTRUDE14_DEPTH + BOSS_EXTRUDE14_DEPTH_BACK)

    # Sketch21 → Boss-Extrude15 (add, two sides: drawn at the far end of the back side and taken through both)
    with BuildSketch(Plane(origin=(0, 0, 10.541), x_dir=(-1, 0, 0), z_dir=(0, 0, -1)).offset(-BOSS_EXTRUDE15_DEPTH_BACK)):
        Polygon((-2.028101851, -2.3876), (-0.796265448, -10.3124), (-0.900870757, -10.3124), (-2.228681211, -2.3876), align=None)
        Polygon((0.796265448, -10.3124), (0.900870757, -10.3124), (2.228681211, -2.3876), (2.028101851, -2.3876), align=None)
    extrude(amount=BOSS_EXTRUDE15_DEPTH + BOSS_EXTRUDE15_DEPTH_BACK)

    # Sketch20 → Boss-Extrude16 (add, two sides: drawn at the far end of the back side and taken through both)
    with BuildSketch(Plane(origin=(0, 0, 9.271), x_dir=(-1, 0, 0), z_dir=(0, 0, -1)).offset(-BOSS_EXTRUDE16_DEPTH_BACK)):
        Polygon((2.228681211, -2.3876), (0.900870757, -10.3124), (0.796265448, -10.3124), (2.028101851, -2.3876), align=None)
        Polygon((-0.900870757, -10.3124), (-0.796265448, -10.3124), (-2.028101851, -2.3876), (-2.228681211, -2.3876), align=None)
    extrude(amount=BOSS_EXTRUDE16_DEPTH + BOSS_EXTRUDE16_DEPTH_BACK)

    # Sketch19 → Boss-Extrude17 (add, two sides: drawn at the far end of the back side and taken through both)
    with BuildSketch(Plane(origin=(0, 0, 8.001), x_dir=(-1, 0, 0), z_dir=(0, 0, -1)).offset(-BOSS_EXTRUDE17_DEPTH_BACK)):
        Polygon((-2.028101851, -2.3876), (-0.796265448, -10.3124), (-0.900870757, -10.3124), (-2.228681211, -2.3876), align=None)
        Polygon((0.796265448, -10.3124), (0.900870757, -10.3124), (2.228681211, -2.3876), (2.028101851, -2.3876), align=None)
    extrude(amount=BOSS_EXTRUDE17_DEPTH + BOSS_EXTRUDE17_DEPTH_BACK)

    # Sketch16 → Boss-Extrude18 (add, two sides: drawn at the far end of the back side and taken through both)
    with BuildSketch(Plane(origin=(0, 0, 8.001), x_dir=(-1, 0, 0), z_dir=(0, 0, -1)).offset(-BOSS_EXTRUDE18_DEPTH_BACK)):
        with BuildLine():
            Line((2.3114, 2.3876), (2.3114, 3.5941))
            ThreePointArc((2.3114, 3.5941), (1.1557, 4.7498), (0, 3.5941))
            Line((0, 3.5941), (0, 2.3876))
            Line((0, 2.3876), (2.3114, 2.3876))
        make_face()
        with Locations((1.1557, 3.5941)):
            Circle(SKETCH16_R, mode=Mode.SUBTRACT)
    extrude(amount=BOSS_EXTRUDE18_DEPTH + BOSS_EXTRUDE18_DEPTH_BACK)

    # Sketch18 → Boss-Extrude19 (add, two sides: drawn at the far end of the back side and taken through both)
    with BuildSketch(Plane(origin=(0, 0, 10.541), x_dir=(-1, 0, 0), z_dir=(0, 0, -1)).offset(-BOSS_EXTRUDE19_DEPTH_BACK)):
        with BuildLine():
            Line((2.3114, 2.3876), (2.3114, 3.5941))
            ThreePointArc((2.3114, 3.5941), (1.1557, 4.7498), (0, 3.5941))
            Line((0, 3.5941), (0, 2.3876))
            Line((0, 2.3876), (2.3114, 2.3876))
        make_face()
        with Locations((1.1557, 3.5941)):
            Circle(SKETCH18_R, mode=Mode.SUBTRACT)
    extrude(amount=BOSS_EXTRUDE19_DEPTH + BOSS_EXTRUDE19_DEPTH_BACK)

    # Sketch17 → Boss-Extrude20 (add, two sides: drawn at the far end of the back side and taken through both)
    with BuildSketch(Plane(origin=(0, 0, 9.271), x_dir=(-1, 0, 0), z_dir=(0, 0, -1)).offset(-BOSS_EXTRUDE20_DEPTH_BACK)):
        with BuildLine():
            Line((-2.3114, 3.5941), (-2.3114, 2.3876))
            Line((-2.3114, 2.3876), (0, 2.3876))
            Line((0, 2.3876), (0, 3.5941))
            ThreePointArc((0, 3.5941), (-1.1557, 4.7498), (-2.3114, 3.5941))
        make_face()
        with Locations((-1.1557, 3.5941)):
            Circle(SKETCH17_R, mode=Mode.SUBTRACT)
    extrude(amount=BOSS_EXTRUDE20_DEPTH + BOSS_EXTRUDE20_DEPTH_BACK)


solid = part.part
